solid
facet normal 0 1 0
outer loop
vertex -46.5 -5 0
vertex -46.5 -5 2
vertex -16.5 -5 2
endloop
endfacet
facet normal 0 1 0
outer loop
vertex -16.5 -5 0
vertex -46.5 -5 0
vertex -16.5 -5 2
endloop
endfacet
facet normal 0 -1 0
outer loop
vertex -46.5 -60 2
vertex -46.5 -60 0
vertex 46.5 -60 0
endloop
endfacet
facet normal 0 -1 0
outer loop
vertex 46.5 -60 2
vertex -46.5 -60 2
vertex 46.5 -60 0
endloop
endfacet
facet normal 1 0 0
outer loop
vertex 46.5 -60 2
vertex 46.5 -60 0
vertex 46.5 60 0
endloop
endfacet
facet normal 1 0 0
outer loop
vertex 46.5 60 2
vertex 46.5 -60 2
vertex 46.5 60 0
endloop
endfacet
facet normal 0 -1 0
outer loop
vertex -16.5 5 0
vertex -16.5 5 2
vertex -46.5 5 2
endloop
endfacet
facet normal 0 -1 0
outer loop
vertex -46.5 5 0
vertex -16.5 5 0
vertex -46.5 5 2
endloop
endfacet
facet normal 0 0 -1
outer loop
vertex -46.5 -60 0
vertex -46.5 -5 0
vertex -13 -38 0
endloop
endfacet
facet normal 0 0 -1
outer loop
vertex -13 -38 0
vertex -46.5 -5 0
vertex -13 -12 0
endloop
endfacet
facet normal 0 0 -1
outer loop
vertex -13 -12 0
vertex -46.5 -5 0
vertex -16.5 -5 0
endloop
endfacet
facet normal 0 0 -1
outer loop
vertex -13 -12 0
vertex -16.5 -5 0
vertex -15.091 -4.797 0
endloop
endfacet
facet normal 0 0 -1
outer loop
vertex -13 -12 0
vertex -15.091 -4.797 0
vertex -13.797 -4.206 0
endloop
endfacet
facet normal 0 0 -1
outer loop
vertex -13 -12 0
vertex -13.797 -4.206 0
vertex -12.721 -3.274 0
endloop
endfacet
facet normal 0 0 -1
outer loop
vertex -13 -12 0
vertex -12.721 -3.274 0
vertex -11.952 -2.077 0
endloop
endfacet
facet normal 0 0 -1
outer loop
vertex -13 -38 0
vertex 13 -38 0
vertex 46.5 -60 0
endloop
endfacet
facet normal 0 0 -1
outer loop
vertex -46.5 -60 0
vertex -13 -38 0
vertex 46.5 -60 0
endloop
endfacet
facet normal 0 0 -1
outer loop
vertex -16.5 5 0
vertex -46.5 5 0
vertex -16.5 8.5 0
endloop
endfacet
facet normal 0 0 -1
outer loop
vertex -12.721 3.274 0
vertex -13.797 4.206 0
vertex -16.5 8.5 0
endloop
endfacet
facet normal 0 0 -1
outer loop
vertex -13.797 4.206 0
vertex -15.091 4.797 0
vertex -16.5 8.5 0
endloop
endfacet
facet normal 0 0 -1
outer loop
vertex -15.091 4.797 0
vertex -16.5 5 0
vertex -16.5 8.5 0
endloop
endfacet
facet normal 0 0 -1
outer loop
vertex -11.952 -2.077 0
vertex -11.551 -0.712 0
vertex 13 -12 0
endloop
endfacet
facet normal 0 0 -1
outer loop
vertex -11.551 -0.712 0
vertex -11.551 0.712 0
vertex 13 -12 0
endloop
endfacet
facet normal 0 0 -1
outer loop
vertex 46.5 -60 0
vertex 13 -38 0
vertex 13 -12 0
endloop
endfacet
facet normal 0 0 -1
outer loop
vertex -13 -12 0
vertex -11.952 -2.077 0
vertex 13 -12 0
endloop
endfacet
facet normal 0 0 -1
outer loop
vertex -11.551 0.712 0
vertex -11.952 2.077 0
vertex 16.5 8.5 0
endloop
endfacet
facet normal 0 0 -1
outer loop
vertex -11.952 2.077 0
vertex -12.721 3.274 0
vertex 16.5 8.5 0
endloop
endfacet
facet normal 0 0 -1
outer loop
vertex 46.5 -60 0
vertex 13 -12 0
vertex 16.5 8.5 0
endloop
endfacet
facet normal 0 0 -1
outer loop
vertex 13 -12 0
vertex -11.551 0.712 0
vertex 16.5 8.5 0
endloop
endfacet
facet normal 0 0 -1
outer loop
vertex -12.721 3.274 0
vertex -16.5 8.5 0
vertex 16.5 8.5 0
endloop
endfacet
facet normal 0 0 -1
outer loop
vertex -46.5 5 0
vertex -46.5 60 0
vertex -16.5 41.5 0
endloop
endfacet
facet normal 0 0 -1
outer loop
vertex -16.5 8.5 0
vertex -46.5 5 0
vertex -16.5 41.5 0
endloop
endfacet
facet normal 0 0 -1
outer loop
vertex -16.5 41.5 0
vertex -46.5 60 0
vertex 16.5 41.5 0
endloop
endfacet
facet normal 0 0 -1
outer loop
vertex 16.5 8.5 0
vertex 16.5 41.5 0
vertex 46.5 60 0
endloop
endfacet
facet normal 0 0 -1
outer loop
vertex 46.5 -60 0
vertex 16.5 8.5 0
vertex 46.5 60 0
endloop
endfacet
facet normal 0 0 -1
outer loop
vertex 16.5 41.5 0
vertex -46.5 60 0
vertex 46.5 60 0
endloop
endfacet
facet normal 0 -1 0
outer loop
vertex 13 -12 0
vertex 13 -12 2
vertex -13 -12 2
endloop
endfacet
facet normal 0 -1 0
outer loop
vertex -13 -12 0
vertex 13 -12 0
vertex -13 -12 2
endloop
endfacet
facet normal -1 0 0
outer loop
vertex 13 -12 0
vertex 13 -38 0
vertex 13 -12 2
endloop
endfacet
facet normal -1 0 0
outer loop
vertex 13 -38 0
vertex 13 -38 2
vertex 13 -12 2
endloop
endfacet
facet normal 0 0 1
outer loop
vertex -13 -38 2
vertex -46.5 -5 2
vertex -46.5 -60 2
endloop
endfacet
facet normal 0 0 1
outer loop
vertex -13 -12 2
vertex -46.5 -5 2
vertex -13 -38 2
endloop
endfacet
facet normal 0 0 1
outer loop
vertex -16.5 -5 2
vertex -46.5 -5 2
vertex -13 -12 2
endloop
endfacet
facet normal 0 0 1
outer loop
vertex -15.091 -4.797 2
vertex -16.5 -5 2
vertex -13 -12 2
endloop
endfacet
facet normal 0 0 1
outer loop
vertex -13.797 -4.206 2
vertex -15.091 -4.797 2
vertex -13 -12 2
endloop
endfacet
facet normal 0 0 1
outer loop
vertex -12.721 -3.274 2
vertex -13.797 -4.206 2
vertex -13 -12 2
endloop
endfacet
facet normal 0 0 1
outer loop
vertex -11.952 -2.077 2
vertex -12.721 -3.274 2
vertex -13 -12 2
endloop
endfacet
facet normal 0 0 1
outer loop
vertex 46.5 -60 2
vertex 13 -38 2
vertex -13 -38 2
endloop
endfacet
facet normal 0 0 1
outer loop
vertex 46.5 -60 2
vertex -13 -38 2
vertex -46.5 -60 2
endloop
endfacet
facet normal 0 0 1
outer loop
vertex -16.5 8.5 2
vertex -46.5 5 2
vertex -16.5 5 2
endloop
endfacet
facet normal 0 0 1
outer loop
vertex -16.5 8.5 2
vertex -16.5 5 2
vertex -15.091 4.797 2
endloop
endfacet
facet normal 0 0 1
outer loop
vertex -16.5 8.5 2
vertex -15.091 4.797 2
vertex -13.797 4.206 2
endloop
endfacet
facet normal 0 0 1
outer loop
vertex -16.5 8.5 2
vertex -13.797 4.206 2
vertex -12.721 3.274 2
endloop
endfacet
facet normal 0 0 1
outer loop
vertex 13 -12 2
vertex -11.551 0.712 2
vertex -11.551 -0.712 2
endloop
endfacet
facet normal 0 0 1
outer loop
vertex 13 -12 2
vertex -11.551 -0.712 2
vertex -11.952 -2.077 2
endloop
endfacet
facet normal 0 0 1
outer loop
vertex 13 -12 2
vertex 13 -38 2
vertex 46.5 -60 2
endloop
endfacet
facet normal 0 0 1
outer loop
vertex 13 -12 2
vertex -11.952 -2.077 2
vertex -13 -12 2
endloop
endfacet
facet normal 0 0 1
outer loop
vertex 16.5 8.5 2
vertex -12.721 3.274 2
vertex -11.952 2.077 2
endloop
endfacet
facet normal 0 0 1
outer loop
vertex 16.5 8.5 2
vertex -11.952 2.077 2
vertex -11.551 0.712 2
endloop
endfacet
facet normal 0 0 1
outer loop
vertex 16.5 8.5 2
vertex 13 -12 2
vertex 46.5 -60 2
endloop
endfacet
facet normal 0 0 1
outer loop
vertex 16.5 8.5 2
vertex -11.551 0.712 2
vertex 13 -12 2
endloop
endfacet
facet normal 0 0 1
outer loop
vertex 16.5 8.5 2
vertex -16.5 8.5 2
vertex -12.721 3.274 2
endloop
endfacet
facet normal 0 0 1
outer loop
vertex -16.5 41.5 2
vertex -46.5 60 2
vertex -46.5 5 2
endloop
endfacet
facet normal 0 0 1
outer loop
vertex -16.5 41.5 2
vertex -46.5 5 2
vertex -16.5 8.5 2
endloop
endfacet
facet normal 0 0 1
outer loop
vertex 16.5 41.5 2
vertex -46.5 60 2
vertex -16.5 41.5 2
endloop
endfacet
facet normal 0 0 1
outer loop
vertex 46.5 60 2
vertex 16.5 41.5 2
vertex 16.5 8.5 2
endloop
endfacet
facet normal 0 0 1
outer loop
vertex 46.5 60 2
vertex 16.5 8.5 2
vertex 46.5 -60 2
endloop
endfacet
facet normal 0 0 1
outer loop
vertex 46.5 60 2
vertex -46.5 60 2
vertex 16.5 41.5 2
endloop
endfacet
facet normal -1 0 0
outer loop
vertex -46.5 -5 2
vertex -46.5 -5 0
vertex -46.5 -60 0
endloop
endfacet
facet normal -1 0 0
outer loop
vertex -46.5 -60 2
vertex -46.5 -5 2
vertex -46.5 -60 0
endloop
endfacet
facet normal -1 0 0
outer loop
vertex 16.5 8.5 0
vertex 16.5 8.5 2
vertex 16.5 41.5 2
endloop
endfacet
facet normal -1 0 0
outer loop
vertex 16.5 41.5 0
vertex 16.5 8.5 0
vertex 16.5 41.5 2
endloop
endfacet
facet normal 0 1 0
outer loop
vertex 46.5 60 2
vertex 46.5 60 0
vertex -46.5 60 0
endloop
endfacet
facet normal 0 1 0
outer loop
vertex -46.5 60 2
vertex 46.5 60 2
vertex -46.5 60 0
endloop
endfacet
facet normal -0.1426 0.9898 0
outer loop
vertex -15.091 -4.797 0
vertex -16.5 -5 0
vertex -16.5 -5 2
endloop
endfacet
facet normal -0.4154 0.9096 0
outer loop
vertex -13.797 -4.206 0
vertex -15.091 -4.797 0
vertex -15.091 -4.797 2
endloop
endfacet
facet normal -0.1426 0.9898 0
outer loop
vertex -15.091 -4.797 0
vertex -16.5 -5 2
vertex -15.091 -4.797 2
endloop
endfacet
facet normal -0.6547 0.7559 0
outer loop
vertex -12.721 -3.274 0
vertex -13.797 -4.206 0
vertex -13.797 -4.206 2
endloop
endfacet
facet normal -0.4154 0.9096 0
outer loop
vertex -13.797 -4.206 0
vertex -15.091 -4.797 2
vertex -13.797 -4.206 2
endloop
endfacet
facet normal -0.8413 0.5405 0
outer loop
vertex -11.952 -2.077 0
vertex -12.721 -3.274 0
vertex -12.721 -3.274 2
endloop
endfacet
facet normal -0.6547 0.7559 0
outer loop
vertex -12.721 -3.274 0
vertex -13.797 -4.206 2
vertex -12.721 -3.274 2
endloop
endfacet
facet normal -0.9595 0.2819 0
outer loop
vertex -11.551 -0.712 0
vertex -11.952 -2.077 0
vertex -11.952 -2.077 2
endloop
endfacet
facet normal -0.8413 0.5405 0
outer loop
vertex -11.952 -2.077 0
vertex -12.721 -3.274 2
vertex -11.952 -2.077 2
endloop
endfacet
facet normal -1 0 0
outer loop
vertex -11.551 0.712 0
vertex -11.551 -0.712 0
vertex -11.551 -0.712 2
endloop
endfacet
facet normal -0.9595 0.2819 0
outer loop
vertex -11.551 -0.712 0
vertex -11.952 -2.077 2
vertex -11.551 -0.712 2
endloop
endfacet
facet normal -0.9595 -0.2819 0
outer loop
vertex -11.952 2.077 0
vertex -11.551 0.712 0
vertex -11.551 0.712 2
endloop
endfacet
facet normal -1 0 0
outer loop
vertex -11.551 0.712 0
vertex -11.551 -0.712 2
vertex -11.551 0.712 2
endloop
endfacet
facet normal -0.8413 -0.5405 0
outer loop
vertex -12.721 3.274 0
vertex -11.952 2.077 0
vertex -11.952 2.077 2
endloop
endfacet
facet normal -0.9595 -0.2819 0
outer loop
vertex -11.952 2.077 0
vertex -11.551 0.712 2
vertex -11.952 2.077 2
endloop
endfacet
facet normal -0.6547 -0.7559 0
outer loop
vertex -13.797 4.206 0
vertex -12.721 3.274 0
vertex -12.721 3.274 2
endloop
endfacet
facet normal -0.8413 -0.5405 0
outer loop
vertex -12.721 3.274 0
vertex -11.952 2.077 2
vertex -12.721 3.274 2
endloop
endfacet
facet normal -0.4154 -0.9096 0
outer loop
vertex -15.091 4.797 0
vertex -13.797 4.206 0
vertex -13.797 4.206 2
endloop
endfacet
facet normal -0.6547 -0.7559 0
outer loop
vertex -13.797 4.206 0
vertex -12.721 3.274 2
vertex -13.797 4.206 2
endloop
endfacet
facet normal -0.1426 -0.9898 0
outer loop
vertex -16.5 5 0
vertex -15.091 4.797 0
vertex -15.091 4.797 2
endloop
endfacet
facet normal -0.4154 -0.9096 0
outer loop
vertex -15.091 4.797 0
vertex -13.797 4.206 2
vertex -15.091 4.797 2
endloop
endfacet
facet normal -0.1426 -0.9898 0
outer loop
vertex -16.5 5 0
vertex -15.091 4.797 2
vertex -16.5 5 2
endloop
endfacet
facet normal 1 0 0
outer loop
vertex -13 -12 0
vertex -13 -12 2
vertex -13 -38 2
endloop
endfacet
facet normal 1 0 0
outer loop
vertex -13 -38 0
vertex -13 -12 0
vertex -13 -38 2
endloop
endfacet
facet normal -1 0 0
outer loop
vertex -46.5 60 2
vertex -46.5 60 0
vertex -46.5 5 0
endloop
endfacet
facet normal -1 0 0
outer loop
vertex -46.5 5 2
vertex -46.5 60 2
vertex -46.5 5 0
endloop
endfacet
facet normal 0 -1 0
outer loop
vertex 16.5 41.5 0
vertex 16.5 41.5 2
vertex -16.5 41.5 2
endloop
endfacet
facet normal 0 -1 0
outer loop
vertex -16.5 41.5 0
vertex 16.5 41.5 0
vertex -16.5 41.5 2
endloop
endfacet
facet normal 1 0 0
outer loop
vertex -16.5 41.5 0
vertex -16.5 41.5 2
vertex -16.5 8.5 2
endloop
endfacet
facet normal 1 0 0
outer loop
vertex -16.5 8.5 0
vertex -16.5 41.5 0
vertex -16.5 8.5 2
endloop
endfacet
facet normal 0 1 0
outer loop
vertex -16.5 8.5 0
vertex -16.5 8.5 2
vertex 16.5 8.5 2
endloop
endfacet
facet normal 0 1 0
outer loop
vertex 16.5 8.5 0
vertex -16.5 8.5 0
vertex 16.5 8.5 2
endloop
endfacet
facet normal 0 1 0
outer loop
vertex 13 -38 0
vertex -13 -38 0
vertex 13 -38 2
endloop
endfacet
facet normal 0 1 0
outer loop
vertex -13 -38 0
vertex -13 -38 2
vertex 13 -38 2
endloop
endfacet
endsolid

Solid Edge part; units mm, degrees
sketch "Sketch1" plane through (0, 0, 0) normal (0, 0, 1) x (1, 0, 0)
  line L0 (-46.5, -60) -> (46.5, -60)
  line L1 (46.5, -60) -> (46.5, 60)
  line L2 (46.5, 60) -> (-46.5, 60)
  line L3 (-46.5, 60) -> (-46.5, -60)
extrude "Protrusion1" add sketch "Sketch1" along normal blind 2
sketch "Sketch2" plane through (0, 0, 2) normal (0, 0, 1) x (1, 0, 0)
  arc A0 (-16.5, 5) -> (-16.5, -5) centre (-16.5, 0) cw
  line L0 (-16.5, 5) -> (-46.5, 5)
  line L1 (-46.5, 5) -> (-46.5, -5)
  line L2 (-46.5, -5) -> (-16.5, -5)
  line L3 (-16.5, 8.5) -> (16.5, 8.5)
  line L4 (16.5, 8.5) -> (16.5, 41.5)
  line L5 (16.5, 41.5) -> (-16.5, 41.5)
  line L6 (-16.5, 41.5) -> (-16.5, 8.5)
  line L7 (13, -12) -> (-13, -12)
  line L8 (-13, -12) -> (-13, -38)
  line L9 (-13, -38) -> (13, -38)
  line L10 (13, -38) -> (13, -12)
extrude "Cutout1" cut sketch "Sketch2" against normal up to next
